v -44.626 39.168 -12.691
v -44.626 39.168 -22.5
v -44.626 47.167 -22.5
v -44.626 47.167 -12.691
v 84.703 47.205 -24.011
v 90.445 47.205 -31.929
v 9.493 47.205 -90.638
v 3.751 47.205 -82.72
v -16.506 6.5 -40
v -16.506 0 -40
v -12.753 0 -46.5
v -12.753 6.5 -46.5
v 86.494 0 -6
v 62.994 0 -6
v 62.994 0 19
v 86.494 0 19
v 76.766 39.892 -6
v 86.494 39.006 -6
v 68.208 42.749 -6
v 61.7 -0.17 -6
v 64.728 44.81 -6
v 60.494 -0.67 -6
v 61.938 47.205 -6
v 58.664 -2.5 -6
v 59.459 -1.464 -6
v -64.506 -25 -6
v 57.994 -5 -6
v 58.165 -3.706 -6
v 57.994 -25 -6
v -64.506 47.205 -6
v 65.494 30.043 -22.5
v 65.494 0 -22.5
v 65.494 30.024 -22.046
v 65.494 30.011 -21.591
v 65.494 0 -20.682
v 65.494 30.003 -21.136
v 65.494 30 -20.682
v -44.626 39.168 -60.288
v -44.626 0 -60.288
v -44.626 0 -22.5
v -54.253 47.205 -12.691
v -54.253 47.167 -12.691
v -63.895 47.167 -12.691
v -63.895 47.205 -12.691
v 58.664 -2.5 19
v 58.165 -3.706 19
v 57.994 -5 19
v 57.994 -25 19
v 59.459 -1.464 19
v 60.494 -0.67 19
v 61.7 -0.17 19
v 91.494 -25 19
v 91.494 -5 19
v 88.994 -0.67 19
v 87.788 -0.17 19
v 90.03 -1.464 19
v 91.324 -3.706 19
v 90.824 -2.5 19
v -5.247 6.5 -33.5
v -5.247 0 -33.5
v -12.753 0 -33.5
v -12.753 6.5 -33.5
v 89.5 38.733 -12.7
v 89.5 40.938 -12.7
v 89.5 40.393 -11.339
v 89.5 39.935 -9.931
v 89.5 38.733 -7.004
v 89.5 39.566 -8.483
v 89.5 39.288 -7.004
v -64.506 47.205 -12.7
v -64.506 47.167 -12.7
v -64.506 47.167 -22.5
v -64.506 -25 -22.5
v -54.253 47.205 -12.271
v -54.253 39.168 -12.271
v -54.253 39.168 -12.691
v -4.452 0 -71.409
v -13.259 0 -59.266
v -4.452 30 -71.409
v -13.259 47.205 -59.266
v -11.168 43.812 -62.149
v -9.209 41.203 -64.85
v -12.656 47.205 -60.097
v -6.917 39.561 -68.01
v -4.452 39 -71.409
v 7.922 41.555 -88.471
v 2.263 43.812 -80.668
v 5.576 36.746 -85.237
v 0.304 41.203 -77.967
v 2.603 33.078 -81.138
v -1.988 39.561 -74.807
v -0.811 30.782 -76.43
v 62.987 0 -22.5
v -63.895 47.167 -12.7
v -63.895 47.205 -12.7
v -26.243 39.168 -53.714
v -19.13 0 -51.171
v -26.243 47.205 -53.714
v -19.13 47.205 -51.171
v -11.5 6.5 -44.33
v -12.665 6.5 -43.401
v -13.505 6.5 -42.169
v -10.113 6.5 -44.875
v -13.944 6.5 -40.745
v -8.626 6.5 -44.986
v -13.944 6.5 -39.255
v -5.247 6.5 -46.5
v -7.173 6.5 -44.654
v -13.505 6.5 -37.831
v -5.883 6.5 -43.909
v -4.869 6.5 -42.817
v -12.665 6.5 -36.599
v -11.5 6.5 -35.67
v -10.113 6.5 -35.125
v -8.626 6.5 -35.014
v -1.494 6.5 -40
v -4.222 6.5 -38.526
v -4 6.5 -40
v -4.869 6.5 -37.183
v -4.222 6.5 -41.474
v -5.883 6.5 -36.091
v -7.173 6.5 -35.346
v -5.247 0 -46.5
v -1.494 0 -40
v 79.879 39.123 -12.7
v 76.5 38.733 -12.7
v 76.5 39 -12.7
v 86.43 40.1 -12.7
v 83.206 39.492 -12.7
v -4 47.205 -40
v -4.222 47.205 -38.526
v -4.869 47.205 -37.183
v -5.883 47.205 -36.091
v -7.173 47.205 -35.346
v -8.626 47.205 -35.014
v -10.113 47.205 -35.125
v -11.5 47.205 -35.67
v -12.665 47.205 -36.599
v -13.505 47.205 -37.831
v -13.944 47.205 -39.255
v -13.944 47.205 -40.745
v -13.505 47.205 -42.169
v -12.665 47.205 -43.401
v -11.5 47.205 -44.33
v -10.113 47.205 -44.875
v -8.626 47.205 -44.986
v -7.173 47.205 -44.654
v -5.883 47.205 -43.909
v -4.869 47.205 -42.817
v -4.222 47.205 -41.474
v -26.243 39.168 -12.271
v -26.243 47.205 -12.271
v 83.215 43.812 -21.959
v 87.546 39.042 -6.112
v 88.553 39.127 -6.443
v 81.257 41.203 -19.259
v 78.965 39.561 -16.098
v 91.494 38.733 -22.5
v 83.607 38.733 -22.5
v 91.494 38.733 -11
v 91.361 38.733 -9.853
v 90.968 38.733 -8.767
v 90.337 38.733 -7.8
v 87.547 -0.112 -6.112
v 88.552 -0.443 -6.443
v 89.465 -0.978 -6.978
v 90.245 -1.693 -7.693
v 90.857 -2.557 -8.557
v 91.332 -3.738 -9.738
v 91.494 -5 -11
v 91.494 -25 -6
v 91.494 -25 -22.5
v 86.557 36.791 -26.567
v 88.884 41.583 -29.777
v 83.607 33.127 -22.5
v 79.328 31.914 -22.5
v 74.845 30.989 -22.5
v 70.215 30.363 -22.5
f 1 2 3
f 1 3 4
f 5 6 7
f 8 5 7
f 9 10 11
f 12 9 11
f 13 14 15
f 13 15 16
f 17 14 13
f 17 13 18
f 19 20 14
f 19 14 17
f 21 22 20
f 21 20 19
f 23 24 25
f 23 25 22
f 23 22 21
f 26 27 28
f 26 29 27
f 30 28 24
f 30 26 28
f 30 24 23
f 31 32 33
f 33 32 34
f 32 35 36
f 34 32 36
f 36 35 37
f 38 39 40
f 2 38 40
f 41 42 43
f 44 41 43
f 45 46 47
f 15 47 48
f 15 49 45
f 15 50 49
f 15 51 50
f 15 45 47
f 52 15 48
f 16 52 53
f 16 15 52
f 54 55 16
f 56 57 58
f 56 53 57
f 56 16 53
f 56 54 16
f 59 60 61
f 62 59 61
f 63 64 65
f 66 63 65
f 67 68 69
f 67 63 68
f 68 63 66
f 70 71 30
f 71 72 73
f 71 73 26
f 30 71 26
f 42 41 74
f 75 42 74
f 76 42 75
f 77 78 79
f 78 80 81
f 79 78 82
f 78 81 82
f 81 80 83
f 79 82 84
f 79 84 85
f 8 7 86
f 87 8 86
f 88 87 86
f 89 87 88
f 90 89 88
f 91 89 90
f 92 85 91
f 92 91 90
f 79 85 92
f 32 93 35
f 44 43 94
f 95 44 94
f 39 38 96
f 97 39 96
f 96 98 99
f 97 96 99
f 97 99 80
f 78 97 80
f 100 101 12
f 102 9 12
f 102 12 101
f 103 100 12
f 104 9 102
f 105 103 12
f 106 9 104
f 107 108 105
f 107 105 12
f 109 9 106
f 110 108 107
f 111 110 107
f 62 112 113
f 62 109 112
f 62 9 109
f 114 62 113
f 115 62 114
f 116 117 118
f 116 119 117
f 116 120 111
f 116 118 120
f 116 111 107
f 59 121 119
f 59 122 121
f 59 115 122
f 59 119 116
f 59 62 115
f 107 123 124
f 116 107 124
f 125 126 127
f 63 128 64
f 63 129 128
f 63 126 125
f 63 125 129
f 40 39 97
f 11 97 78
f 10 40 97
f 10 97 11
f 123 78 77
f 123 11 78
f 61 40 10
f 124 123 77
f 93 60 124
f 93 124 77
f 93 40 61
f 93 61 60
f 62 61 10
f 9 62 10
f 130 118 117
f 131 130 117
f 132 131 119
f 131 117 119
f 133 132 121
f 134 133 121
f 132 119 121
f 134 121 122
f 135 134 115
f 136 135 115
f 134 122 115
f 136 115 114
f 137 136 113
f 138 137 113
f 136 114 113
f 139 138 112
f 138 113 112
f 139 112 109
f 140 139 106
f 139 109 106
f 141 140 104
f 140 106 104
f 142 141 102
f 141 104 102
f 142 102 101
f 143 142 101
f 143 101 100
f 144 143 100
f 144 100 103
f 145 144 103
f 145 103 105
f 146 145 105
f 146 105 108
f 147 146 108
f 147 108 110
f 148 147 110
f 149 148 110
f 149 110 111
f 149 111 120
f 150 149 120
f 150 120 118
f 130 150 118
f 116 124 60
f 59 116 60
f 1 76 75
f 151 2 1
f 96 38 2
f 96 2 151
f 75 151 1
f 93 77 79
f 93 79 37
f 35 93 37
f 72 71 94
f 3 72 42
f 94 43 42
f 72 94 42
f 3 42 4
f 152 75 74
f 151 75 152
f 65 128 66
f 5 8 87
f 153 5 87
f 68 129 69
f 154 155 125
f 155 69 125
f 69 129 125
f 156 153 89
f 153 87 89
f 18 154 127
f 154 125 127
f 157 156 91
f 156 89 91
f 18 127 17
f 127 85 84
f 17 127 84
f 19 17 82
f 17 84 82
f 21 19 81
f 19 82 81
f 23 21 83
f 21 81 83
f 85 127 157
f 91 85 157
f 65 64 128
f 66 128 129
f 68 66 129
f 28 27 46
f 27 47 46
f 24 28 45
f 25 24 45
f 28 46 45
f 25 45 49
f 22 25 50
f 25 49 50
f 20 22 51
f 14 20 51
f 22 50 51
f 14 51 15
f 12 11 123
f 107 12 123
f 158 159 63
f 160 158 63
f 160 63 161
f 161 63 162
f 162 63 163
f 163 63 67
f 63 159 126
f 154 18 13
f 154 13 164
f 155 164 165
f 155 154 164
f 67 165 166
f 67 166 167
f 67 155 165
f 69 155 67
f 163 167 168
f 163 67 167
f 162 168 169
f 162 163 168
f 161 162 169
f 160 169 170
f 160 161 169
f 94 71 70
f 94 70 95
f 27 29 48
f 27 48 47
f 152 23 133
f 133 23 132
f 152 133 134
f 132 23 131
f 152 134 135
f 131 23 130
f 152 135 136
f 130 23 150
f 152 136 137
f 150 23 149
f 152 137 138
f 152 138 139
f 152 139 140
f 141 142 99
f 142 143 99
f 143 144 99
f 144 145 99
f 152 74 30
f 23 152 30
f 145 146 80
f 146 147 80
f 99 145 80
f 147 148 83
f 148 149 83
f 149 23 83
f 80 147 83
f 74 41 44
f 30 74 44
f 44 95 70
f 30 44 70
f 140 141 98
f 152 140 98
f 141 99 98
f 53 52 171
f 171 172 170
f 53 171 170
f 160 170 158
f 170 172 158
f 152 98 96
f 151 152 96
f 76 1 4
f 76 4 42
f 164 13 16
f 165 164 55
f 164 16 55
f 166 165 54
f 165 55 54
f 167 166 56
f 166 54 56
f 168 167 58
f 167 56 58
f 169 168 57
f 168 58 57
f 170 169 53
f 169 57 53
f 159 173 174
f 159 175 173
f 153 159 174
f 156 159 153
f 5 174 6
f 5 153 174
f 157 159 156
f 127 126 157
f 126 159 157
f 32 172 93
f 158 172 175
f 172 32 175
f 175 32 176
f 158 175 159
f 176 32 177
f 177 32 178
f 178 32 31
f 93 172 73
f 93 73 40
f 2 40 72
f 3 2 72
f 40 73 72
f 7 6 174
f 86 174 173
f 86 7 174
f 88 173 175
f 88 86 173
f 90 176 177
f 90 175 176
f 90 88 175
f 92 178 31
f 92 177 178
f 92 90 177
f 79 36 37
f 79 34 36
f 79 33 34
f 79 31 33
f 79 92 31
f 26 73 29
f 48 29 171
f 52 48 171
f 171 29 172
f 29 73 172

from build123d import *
from build123d import SkipClean  # not in build123d's __all__

# Parameters (mm, degrees)
F0_W      = 131
F0_H      = 155.25
F0_R      = 5
F0_R_2    = 10
F1_DEPTH  = 12.7
F2_DEPTH  = 150
F3_R      = 4.7625
F4_DEPTH  = 167.951
F6_DEPTH  = 55
F9_W      = 46.4503765106
F9_H      = 23.6088857055
F10_DEPTH = 100.6187200546
F12_DEPTH = 150.001
F14_DEPTH = 89.0000760555
F15_R     = 16
F16_DEPTH = 210.4837932836
F18_W     = 28.0103459954
F18_H     = 33.3821959794
F19_DEPTH = 57.4413500726
F23_DEPTH = 37.3063087463
F25_DEPTH = 262.8513174901
F26_W     = 130
F26_H     = 33
F27_DEPTH = 25
F28_DEPTH = 47.1665114164
F29_W     = 130
F29_H     = 16.5
F30_DEPTH = 118.0664598942
F32_DEPTH = 6.5
F33_R     = 5
F34_DEPTH = 47.2060309181
F35_W     = 63.7330800295
F35_H     = 16.5
F36_DEPTH = 26
F37_W     = 33.5
F37_H     = 25
F38_DEPTH = 25
F39_R     = 5
F41_DEPTH = 150.837957859


with BuildPart() as f1:
    # F0 (on Front) → F1 (new body)
    with BuildSketch(Plane.XZ):
        with Locations((0, 77.625)):
            Rectangle(F0_W, F0_H)
        with Locations((-32.75, 57)):
            Circle(F0_R, mode=Mode.SUBTRACT)
        with Locations((32.75, 57)):
            Circle(F0_R, mode=Mode.SUBTRACT)
        with Locations((0, 89.75)):
            Circle(F0_R_2, mode=Mode.SUBTRACT)
        with Locations((-32.75, 122.5)):
            Circle(F0_R, mode=Mode.SUBTRACT)
        with Locations((32.75, 122.5)):
            Circle(F0_R, mode=Mode.SUBTRACT)
    extrude(amount=-F1_DEPTH)

    # F0 (on Front) → F2 (join)
    with BuildSketch(Plane.XZ):
        Polygon((89.5, 0), (65.5, 0), (-65.5, 0), (-65.5, -12.7), (89.5, -12.7), align=None)
    extrude(amount=-F2_DEPTH)

    # F3 (on face) → F4 (cut, through all)
    with BuildSketch(Plane(origin=(0, 0, -12.7), x_dir=(1, 0, 0), z_dir=(0, 0, -1))):
        with Locations((-40, -55.7)):
            Circle(F3_R)
        with Locations((-40, -118.2)):
            Circle(F3_R)
        with Locations((64, -118.2)):
            Circle(F3_R)
        with Locations((64, -55.7)):
            Circle(F3_R)
    extrude(amount=-F4_DEPTH, mode=Mode.SUBTRACT)

    # F5 (on face) → F6 (join)
    with BuildSketch(Plane.XZ):
        Polygon((76.5, -12.7), (-63.5, -12.7), (-44.9285714286, -100.7630571853), align=None)
    extrude(amount=-F6_DEPTH)

    # F7 (on face) → F8 (revolve)
    with BuildSketch(Plane(origin=(32.4031609217, 0, -44.6801379177), x_dir=(0.8095238095, 0, 0.5870870479), z_dir=(0.5870870479, 0, -0.8095238095))):
        Polygon((18.2698592544, -40), (54.4725659202, -40), (54.4725659202, -30), (-45.5274340798, -30), (-45.5274340798, -40), align=None)
    revolve(axis=Axis((36.0238095238, 55, -42.0543523951), (-0.8095238095, 0, -0.5870870479)))

    # F9 (on face) → F10 (cut)
    with BuildSketch(Plane.YZ.offset(89.5)):
        with Locations((57.3695674539, 11.8044428527)):
            Rectangle(F9_W, F9_H)
    extrude(amount=-F10_DEPTH, mode=Mode.SUBTRACT)

    # F11 (on Front) → F12 (cut, through all)
    with BuildSketch(Plane.XZ):
        Polygon((-55.6169226766, -72.8361010551), (-44.6262694895, -72.8361010551), (-44.6262694895, -12.6905664802), (-63.8953074813, -12.6905664802), (-63.8953074813, -72.8361010551), align=None)
        Polygon((-4.5890193433, -104.113265872), (-4.5890193433, -72.8361010551), (-44.6262694895, -72.8361010551), (-55.6169226766, -72.8361010551), (-55.6169226766, -104.113265872), align=None)
    extrude(amount=-F12_DEPTH, mode=Mode.SUBTRACT)

    # F13 (on face) → F14 (cut)
    with BuildSketch(Plane(origin=(0, 55, 0), x_dir=(-1, 0, 0), z_dir=(0, 1, 0))):
        Polygon((76.3912552581, -71.6465198879), (44.6262694895, -60.2878452083), (44.6262694895, -72.8361010551), (6.4205920826, -72.8361010551), (4.4523809524, -71.4087047902), (-10.0519139283, -91.4084170785), (37.2047263411, -125.6801223738), align=None)
        Polygon((44.6262694895, -60.2878452083), (19.1295571499, -51.1706095521), (13.2586866709, -59.2658476473), (4.4523809524, -71.4087047902), (6.4205920826, -72.8361010551), (44.6262694895, -72.8361010551), align=None)
    extrude(amount=-F14_DEPTH, mode=Mode.SUBTRACT)

    # F15 (on face) → F16 (cut, through all)
    with BuildSketch(Plane(origin=(-36.8555418741, 0, -26.7285668724), x_dir=(0, -1, 0), z_dir=(-0.8095238095, 0, -0.5870870479))):
        with Locations((-55, -55.1931115454)):
            Circle(F15_R)
        with BuildLine():
            ThreePointArc((-40, -55.1931115454), (-65.6066017178, -65.7997132632), (-55, -40.1931115454))
            Line((-55, -40.1931115454), (-55, -55.1931115454))
            Line((-55, -55.1931115454), (-40, -55.1931115454))
        make_face(mode=Mode.SUBTRACT)
        with BuildLine():
            Line((-55, -55.1931115454), (-55, -40.1931115454))
            ThreePointArc((-55, -40.1931115454), (-65.6066017178, -65.7997132632), (-40, -55.1931115454))
            Line((-40, -55.1931115454), (-55, -55.1931115454))
        make_face()
    with SkipClean():  # cleaning this boolean's faces spoils the solid; the shape is the same uncleaned
        extrude(amount=-F16_DEPTH, mode=Mode.SUBTRACT)

    # F18 (on offset) → F19 (cut)
    with BuildSketch(Plane(origin=(0, 0, -69.7121929049), x_dir=(1, 0, 0), z_dir=(0, 0, -1))):
        with Locations((-40.2482412755, -55.8588486165)):
            Rectangle(F18_W, F18_H)
    with SkipClean():  # cleaning this boolean's faces spoils the solid; the shape is the same uncleaned
        extrude(amount=-F19_DEPTH, mode=Mode.SUBTRACT)

    # F22 (on offset) → F23 (join)
    with BuildSketch(Plane(origin=(0, 66.3563400507, 0), x_dir=(-1, 0, 0), z_dir=(0, 1, 0))):
        Polygon((-19.5, -25.368578732), (9.2864632607, -47.1396760544), (25.5, -47.1396760544), (25.5, -10.8354373375), (-19.5, -10.8354373375), align=None)
    with SkipClean():  # cleaning this boolean's faces spoils the solid; the shape is the same uncleaned
        extrude(amount=-F23_DEPTH)

    # F24 (on offset) → F25 (cut, through all)
    with BuildSketch(Plane(origin=(0, 0, -107.6003174901), x_dir=(1, 0, 0), z_dir=(0, 0, -1))):
        Polygon((105.054743588, -47.2050309181), (-70.2532827854, -47.2050309181), (-70.2532827854, -164.4858419895), (108.5324063897, -164.4858419895), align=None)
    extrude(amount=-F25_DEPTH, mode=Mode.SUBTRACT)

    # F26 (on Front) → F27 (join)
    with BuildSketch(Plane.XZ):
        with Locations((0.4943662184, -6)):
            Rectangle(F26_W, F26_H)
    extrude(amount=F27_DEPTH)

    # F28 (add): a face of the model
    f28_faces = [f1.faces().sort_by_distance(p)[0] for p in [
        (-54.5656671683, 0, -17.5954279167),
    ]]
    extrude(f28_faces, amount=F28_DEPTH)

    # F29 (on face) → F30 (cut)
    with BuildSketch(Plane.XZ.offset(25)):
        Polygon((65.4943662184, -6), (102.4388783057, -6), (114.364810288, 171.1933612823), (-95.0750373681, 171.1933612823), (-95.0750373681, -6), (-64.5056337816, -6), (-64.5056337816, 10.5), (65.4943662184, 10.5), align=None)
        with Locations((0.4943662184, 2.25)):
            Rectangle(F29_W, F29_H)
    extrude(amount=-F30_DEPTH, mode=Mode.SUBTRACT)

    # F31 (on face) → F32 (cut)
    with BuildSketch(Plane.XZ):
        Polygon((-12.7527767497, -46.5), (-5.2472232503, -46.5), (-1.4944465005, -40), (-5.2472232503, -33.5), (-12.7527767497, -33.5), (-16.5055534995, -40), align=None)
    extrude(amount=-F32_DEPTH, mode=Mode.SUBTRACT)

    # F33 (on face) → F34 (cut, through all)
    with BuildSketch(Plane.XZ):
        with Locations((-9, -40)):
            Circle(F33_R)
    extrude(amount=-F34_DEPTH, mode=Mode.SUBTRACT)

    # F35 (on face) → F36 (join)
    with BuildSketch(Plane.YZ.offset(65.4943662184)):
        with Locations((6.8665400147, -14.25)):
            Rectangle(F35_W, F35_H)
    extrude(amount=F36_DEPTH)

    # F37 (on face) → F38 (join)
    with BuildSketch(Plane.XY.offset(-6)):
        with Locations((74.7443662184, -12.5)):
            Rectangle(F37_W, F37_H)
    extrude(amount=F38_DEPTH)

    # F39
    f39_edges = [f1.edges().sort_by_distance(p)[0] for p in [
        (57.994366, 0, 6.5),
        (91.494366, 0, 6.5),
        (91.494366, 19.36654, -6),
    ]]
    fillet(f39_edges, radius=F39_R)

    # F40 (on face) → F41 (cut)
    with BuildSketch(Plane(origin=(0, 0, -22.5), x_dir=(1, 0, 0), z_dir=(0, 0, -1))):
        Polygon((-64.5056337816, -47.1665114164), (-64.5056337816, 25), (-82.232825458, 25), (-82.232825458, -50.1768067479), (-64.5056337816, -50.1768067479), align=None)
    extrude(amount=-F41_DEPTH, mode=Mode.SUBTRACT)


solid = f1.part
